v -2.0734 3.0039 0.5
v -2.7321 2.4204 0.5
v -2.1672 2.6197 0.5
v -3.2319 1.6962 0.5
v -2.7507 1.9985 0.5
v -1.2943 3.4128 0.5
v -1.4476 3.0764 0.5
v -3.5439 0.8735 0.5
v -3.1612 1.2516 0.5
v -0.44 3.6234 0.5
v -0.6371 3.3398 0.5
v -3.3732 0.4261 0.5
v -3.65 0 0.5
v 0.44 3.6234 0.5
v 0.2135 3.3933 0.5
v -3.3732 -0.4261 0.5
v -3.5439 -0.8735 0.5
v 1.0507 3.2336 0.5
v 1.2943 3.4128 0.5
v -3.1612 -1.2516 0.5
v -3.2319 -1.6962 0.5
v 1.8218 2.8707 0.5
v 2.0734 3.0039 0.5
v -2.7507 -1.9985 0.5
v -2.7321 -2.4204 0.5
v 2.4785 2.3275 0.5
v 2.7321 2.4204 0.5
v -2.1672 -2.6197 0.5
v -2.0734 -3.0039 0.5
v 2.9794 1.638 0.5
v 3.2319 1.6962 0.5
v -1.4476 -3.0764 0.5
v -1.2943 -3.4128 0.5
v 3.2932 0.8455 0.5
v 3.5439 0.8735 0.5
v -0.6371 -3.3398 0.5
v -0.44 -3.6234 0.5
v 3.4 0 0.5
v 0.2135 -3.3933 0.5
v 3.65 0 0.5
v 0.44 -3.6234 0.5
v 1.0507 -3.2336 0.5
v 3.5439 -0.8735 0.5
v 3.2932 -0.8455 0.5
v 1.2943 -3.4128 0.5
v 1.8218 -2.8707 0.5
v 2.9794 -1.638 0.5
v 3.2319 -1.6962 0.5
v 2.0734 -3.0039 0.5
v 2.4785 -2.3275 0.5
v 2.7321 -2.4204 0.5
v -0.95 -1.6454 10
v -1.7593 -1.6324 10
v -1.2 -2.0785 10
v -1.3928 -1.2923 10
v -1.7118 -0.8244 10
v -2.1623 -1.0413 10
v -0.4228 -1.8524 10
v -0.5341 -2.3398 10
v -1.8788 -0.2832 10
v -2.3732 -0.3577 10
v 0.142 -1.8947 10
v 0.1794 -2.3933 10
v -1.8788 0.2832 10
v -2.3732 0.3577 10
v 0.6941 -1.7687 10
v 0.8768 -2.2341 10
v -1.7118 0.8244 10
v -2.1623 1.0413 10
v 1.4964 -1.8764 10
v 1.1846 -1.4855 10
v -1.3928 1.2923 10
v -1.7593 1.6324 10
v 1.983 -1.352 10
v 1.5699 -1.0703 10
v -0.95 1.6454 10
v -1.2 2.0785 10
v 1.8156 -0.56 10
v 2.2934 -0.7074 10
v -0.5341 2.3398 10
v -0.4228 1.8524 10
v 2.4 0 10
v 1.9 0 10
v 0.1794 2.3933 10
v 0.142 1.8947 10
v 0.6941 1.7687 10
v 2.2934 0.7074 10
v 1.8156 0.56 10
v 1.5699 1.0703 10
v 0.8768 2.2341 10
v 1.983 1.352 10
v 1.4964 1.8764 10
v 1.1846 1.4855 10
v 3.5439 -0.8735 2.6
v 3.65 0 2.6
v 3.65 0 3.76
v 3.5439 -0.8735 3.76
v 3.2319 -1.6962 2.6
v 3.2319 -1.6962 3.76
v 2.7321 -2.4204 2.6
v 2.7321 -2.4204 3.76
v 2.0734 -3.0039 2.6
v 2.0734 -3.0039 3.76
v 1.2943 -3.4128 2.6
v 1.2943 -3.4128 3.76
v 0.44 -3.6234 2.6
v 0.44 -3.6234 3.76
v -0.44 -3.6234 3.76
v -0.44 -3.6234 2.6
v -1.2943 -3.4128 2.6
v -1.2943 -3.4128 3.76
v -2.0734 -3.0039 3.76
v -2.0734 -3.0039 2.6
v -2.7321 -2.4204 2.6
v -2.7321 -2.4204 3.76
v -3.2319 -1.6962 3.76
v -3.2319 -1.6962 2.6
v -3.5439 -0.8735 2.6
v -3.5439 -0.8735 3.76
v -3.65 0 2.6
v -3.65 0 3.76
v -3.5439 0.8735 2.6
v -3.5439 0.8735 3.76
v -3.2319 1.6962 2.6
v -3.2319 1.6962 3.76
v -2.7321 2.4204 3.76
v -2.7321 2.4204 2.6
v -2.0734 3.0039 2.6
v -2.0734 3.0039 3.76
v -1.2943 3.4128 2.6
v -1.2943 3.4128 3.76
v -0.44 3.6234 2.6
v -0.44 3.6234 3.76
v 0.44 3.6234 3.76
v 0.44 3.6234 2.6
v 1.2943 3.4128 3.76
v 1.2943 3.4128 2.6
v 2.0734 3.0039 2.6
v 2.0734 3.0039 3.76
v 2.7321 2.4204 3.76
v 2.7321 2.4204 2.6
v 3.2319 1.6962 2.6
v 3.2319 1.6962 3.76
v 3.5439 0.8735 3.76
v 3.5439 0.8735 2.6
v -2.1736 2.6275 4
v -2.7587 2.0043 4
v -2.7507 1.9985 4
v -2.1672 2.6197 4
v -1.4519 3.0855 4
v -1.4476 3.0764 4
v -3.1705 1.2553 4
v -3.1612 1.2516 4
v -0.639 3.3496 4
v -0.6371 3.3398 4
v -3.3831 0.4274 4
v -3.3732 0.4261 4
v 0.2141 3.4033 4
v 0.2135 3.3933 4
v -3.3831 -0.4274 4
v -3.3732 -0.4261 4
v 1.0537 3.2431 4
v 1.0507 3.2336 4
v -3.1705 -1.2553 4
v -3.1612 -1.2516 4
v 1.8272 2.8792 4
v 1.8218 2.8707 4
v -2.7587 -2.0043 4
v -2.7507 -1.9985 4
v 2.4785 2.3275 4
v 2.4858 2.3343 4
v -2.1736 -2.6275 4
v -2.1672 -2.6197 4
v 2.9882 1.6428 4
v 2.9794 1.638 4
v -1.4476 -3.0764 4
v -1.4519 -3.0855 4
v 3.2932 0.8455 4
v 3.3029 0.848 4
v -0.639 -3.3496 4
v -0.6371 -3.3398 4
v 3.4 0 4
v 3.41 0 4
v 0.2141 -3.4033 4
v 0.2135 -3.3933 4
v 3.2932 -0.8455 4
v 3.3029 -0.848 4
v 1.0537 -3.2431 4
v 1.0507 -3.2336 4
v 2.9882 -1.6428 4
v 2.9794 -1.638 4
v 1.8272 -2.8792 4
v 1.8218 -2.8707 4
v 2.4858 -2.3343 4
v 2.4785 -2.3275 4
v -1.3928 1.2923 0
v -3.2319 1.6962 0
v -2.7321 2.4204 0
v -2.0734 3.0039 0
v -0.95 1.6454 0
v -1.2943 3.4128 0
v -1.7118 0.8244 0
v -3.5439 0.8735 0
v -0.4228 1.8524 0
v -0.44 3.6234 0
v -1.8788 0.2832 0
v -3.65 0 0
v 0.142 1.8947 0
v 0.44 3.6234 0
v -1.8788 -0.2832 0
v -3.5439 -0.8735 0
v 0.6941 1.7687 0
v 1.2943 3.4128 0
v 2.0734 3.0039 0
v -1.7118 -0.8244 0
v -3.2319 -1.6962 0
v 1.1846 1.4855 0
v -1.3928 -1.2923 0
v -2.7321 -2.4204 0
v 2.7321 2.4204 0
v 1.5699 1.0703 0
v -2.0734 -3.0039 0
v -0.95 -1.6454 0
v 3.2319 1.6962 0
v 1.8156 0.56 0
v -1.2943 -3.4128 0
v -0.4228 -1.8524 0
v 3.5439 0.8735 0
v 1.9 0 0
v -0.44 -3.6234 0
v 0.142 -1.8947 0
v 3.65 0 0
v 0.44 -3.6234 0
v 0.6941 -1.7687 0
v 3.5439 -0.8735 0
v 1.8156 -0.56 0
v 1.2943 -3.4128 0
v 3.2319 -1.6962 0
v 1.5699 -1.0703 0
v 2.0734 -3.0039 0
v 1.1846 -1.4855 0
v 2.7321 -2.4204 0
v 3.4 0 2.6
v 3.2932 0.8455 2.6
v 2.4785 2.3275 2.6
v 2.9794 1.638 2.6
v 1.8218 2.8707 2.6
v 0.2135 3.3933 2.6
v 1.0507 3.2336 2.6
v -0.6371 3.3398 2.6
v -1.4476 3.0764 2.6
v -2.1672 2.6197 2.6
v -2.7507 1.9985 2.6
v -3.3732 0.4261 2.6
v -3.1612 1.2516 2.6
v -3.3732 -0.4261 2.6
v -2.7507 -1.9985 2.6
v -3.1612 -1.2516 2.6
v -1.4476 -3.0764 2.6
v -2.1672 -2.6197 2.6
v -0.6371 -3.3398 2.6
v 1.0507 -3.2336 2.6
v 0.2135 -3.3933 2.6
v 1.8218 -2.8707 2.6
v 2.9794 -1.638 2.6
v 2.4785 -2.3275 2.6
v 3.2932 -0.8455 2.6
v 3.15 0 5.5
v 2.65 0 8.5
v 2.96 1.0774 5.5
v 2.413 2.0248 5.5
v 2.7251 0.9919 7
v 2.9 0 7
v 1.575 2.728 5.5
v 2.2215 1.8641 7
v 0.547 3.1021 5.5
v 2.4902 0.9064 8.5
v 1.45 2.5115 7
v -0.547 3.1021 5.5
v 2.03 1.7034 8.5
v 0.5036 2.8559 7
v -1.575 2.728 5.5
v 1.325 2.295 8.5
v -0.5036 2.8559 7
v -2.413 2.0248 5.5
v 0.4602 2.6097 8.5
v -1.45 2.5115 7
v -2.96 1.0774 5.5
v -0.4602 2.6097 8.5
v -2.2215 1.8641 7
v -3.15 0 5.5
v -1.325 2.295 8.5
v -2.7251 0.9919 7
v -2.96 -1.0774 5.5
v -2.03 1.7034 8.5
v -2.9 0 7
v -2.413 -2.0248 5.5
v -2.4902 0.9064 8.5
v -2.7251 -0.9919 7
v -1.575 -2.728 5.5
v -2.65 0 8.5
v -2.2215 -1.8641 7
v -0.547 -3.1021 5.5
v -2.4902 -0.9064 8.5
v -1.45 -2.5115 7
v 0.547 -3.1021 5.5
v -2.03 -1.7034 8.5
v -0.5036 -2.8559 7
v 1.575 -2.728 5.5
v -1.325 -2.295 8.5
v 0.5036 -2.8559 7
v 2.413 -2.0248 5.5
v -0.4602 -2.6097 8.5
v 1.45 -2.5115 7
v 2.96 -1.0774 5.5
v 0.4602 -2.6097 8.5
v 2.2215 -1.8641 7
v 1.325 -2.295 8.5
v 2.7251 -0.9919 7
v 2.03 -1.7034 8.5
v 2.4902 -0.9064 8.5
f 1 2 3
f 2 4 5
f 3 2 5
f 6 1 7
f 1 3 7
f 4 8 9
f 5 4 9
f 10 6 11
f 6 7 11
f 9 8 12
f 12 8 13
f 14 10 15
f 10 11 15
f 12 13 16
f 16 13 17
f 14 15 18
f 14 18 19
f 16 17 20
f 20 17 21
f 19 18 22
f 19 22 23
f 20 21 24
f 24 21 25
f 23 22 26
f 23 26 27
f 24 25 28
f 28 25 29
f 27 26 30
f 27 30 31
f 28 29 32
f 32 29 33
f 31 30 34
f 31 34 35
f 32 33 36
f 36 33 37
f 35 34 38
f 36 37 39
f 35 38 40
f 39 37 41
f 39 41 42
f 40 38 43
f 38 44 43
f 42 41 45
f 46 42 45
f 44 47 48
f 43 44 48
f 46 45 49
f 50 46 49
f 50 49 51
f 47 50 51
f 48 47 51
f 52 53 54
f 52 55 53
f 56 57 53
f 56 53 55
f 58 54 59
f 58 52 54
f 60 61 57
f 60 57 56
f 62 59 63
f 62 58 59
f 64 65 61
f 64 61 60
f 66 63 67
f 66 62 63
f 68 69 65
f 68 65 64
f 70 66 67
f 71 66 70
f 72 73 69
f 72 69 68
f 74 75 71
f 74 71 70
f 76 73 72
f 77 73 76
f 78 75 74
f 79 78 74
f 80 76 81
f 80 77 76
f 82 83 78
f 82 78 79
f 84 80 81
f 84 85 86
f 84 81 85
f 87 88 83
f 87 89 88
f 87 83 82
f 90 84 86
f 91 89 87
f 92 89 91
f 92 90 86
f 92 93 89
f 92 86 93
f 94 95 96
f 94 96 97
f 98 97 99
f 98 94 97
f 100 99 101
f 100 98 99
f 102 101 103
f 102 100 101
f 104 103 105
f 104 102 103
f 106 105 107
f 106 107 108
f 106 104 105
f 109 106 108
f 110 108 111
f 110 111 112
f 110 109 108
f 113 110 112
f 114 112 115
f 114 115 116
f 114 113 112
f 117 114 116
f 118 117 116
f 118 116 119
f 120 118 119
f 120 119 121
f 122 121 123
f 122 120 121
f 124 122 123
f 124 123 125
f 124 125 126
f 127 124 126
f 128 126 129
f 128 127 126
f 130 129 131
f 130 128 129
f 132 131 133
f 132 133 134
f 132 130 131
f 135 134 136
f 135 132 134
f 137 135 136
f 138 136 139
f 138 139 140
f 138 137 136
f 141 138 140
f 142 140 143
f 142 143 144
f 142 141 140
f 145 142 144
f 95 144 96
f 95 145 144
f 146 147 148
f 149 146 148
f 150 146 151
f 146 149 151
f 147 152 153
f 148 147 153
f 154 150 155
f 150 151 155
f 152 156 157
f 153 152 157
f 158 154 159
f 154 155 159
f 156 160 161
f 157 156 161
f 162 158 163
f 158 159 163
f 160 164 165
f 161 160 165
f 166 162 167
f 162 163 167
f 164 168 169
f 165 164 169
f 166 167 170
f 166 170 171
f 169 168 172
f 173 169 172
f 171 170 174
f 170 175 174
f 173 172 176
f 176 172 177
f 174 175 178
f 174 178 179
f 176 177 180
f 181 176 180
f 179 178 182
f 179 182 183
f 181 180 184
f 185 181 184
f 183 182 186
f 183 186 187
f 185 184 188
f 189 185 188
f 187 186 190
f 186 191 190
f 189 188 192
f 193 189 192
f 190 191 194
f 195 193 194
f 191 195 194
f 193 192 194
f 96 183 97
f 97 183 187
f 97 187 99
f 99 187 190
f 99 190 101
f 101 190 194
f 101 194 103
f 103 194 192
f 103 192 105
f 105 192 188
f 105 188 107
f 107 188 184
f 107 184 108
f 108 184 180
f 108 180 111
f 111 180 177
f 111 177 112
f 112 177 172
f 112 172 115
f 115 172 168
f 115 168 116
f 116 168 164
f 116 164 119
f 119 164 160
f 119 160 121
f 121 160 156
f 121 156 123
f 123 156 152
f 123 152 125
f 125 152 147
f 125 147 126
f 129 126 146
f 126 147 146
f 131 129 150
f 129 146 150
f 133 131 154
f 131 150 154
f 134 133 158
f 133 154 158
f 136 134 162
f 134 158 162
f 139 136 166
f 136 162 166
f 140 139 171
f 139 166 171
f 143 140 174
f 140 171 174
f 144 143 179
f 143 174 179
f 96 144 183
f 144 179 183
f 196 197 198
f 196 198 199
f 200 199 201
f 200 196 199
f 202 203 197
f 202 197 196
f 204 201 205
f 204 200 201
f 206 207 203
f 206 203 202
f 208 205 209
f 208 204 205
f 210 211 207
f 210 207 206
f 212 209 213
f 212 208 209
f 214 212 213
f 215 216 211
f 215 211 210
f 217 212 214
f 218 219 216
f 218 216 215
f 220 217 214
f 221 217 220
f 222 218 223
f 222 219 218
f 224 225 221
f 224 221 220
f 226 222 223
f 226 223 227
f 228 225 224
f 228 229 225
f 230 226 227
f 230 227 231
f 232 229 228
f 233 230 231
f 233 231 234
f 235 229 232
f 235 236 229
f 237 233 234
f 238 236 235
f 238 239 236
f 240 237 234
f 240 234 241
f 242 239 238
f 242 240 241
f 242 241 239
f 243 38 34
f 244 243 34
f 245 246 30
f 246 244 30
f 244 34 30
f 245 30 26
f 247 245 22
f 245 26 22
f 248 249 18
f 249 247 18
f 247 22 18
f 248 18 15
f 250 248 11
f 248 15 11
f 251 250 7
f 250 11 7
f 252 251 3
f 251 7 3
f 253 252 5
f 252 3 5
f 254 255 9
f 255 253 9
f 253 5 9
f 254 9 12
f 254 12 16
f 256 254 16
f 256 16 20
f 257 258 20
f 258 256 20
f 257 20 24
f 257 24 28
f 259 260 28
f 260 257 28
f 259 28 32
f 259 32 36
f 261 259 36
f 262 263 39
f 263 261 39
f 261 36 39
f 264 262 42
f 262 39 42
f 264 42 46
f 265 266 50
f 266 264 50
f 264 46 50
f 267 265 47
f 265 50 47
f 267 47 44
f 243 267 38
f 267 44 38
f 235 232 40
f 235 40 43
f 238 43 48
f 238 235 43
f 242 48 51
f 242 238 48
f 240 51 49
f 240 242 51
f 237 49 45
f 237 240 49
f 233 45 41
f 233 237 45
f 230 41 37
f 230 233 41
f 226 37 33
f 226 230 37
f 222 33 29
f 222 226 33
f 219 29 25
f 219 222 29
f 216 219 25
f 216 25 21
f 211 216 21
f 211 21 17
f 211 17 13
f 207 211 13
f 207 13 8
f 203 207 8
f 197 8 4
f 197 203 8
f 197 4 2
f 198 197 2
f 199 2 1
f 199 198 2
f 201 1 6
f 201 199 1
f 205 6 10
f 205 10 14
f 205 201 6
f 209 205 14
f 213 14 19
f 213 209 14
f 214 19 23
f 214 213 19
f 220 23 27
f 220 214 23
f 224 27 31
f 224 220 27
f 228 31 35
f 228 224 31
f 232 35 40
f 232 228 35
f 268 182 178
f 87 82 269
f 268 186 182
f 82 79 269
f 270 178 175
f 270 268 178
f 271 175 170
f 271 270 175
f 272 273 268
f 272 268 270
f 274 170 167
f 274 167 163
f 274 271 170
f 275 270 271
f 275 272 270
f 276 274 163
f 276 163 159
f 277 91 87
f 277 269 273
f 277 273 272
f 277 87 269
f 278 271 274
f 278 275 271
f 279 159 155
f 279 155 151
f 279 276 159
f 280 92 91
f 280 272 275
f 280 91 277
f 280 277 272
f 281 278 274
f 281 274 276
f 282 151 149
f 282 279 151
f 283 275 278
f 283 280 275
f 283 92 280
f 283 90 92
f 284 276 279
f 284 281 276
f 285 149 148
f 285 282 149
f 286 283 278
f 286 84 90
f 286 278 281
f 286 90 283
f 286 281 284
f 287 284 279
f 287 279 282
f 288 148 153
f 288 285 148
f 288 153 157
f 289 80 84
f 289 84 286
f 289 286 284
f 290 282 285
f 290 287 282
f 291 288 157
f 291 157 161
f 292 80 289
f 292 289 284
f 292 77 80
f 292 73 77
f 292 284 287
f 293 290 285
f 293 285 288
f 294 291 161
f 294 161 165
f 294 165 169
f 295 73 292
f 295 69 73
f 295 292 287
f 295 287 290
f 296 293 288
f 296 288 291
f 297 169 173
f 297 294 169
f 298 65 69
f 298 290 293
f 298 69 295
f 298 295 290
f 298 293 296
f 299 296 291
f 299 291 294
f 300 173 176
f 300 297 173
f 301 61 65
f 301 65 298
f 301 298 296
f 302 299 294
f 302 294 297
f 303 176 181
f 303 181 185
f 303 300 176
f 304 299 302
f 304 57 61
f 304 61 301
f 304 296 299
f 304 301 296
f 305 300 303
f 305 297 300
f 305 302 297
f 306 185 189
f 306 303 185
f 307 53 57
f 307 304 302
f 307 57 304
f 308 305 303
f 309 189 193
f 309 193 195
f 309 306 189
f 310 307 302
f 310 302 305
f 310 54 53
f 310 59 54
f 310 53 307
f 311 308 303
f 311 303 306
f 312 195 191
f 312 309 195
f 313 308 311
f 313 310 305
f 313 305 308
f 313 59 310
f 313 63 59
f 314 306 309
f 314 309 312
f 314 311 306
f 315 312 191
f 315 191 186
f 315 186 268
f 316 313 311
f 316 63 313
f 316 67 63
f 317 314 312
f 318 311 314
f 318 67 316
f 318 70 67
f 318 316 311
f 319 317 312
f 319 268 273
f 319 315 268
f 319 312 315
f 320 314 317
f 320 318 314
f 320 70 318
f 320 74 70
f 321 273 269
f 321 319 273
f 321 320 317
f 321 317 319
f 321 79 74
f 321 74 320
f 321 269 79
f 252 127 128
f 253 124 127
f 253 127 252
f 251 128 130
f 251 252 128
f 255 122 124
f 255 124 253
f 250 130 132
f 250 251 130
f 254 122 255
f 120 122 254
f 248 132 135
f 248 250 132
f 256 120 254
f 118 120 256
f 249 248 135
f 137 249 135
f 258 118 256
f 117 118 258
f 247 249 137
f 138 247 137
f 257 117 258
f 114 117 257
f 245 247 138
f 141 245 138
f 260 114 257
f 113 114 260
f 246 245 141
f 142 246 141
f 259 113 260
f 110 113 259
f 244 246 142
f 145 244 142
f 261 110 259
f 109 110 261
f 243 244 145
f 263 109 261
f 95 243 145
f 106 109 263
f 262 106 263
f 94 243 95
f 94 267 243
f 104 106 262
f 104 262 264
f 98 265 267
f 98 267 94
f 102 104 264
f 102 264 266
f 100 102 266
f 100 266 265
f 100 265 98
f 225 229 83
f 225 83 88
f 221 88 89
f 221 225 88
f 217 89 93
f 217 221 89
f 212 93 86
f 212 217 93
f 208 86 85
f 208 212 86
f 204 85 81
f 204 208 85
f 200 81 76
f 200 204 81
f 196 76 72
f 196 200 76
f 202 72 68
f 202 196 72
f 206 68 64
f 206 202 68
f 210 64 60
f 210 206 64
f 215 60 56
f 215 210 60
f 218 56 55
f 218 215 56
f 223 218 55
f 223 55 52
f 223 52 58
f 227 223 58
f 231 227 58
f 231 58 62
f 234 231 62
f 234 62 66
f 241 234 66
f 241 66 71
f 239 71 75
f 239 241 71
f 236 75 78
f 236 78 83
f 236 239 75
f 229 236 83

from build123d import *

# Parameters (mm, degrees)
SKETCH_R        = 3.4
SKETCH_R_2      = 1.9
PAD_DEPTH       = 10
CHAMFER_SIZE2   = 1
CHAMFER_SIZE    = 6
PAD001_START    = -2.6
SKETCH001_R     = 3.65
SKETCH001_R_2   = 3.4
PAD001_DEPTH    = 1.4
SKETCH002_R     = 3.65
SKETCH002_R_2   = 3.4
PAD002_DEPTH    = 0.5
CHAMFER001_SIZE = 0.24


with BuildPart() as part:
    # Sketch → Pad (new body)
    with BuildSketch(Plane.XY):
        Circle(SKETCH_R)
        Circle(SKETCH_R_2, mode=Mode.SUBTRACT)
    extrude(amount=PAD_DEPTH)

    # Chamfer
    chamfer_edges = [part.edges().sort_by_distance(p)[0] for p in [
        (-3.4, 0, 10),
    ]]
    chamfer_side = part.faces().sort_by_distance((-3.4, 0, 5))[0]
    chamfer(chamfer_edges, length=CHAMFER_SIZE, length2=CHAMFER_SIZE2, reference=chamfer_side)

    # Sketch001 (on Face3 of Chamfer) → Pad001 (join)
    with BuildSketch(Plane(origin=(0, 0, 0), x_dir=(1, 0, 0), z_dir=(0, 0, -1)).offset(PAD001_START)):
        Circle(SKETCH001_R)
        Circle(SKETCH001_R_2, mode=Mode.SUBTRACT)
    extrude(amount=-PAD001_DEPTH)

    # Sketch002 (on Face2 of Pad001) → Pad002 (join)
    with BuildSketch(Plane(origin=(0, 0, 0), x_dir=(1, 0, 0), z_dir=(0, 0, -1))):
        Circle(SKETCH002_R)
        Circle(SKETCH002_R_2, mode=Mode.SUBTRACT)
    extrude(amount=-PAD002_DEPTH)

    # Chamfer001
    chamfer001_edges = [part.edges().sort_by_distance(p)[0] for p in [
        (-3.65, 0, 4),
    ]]
    chamfer(chamfer001_edges, length=CHAMFER001_SIZE)


solid = part.part
